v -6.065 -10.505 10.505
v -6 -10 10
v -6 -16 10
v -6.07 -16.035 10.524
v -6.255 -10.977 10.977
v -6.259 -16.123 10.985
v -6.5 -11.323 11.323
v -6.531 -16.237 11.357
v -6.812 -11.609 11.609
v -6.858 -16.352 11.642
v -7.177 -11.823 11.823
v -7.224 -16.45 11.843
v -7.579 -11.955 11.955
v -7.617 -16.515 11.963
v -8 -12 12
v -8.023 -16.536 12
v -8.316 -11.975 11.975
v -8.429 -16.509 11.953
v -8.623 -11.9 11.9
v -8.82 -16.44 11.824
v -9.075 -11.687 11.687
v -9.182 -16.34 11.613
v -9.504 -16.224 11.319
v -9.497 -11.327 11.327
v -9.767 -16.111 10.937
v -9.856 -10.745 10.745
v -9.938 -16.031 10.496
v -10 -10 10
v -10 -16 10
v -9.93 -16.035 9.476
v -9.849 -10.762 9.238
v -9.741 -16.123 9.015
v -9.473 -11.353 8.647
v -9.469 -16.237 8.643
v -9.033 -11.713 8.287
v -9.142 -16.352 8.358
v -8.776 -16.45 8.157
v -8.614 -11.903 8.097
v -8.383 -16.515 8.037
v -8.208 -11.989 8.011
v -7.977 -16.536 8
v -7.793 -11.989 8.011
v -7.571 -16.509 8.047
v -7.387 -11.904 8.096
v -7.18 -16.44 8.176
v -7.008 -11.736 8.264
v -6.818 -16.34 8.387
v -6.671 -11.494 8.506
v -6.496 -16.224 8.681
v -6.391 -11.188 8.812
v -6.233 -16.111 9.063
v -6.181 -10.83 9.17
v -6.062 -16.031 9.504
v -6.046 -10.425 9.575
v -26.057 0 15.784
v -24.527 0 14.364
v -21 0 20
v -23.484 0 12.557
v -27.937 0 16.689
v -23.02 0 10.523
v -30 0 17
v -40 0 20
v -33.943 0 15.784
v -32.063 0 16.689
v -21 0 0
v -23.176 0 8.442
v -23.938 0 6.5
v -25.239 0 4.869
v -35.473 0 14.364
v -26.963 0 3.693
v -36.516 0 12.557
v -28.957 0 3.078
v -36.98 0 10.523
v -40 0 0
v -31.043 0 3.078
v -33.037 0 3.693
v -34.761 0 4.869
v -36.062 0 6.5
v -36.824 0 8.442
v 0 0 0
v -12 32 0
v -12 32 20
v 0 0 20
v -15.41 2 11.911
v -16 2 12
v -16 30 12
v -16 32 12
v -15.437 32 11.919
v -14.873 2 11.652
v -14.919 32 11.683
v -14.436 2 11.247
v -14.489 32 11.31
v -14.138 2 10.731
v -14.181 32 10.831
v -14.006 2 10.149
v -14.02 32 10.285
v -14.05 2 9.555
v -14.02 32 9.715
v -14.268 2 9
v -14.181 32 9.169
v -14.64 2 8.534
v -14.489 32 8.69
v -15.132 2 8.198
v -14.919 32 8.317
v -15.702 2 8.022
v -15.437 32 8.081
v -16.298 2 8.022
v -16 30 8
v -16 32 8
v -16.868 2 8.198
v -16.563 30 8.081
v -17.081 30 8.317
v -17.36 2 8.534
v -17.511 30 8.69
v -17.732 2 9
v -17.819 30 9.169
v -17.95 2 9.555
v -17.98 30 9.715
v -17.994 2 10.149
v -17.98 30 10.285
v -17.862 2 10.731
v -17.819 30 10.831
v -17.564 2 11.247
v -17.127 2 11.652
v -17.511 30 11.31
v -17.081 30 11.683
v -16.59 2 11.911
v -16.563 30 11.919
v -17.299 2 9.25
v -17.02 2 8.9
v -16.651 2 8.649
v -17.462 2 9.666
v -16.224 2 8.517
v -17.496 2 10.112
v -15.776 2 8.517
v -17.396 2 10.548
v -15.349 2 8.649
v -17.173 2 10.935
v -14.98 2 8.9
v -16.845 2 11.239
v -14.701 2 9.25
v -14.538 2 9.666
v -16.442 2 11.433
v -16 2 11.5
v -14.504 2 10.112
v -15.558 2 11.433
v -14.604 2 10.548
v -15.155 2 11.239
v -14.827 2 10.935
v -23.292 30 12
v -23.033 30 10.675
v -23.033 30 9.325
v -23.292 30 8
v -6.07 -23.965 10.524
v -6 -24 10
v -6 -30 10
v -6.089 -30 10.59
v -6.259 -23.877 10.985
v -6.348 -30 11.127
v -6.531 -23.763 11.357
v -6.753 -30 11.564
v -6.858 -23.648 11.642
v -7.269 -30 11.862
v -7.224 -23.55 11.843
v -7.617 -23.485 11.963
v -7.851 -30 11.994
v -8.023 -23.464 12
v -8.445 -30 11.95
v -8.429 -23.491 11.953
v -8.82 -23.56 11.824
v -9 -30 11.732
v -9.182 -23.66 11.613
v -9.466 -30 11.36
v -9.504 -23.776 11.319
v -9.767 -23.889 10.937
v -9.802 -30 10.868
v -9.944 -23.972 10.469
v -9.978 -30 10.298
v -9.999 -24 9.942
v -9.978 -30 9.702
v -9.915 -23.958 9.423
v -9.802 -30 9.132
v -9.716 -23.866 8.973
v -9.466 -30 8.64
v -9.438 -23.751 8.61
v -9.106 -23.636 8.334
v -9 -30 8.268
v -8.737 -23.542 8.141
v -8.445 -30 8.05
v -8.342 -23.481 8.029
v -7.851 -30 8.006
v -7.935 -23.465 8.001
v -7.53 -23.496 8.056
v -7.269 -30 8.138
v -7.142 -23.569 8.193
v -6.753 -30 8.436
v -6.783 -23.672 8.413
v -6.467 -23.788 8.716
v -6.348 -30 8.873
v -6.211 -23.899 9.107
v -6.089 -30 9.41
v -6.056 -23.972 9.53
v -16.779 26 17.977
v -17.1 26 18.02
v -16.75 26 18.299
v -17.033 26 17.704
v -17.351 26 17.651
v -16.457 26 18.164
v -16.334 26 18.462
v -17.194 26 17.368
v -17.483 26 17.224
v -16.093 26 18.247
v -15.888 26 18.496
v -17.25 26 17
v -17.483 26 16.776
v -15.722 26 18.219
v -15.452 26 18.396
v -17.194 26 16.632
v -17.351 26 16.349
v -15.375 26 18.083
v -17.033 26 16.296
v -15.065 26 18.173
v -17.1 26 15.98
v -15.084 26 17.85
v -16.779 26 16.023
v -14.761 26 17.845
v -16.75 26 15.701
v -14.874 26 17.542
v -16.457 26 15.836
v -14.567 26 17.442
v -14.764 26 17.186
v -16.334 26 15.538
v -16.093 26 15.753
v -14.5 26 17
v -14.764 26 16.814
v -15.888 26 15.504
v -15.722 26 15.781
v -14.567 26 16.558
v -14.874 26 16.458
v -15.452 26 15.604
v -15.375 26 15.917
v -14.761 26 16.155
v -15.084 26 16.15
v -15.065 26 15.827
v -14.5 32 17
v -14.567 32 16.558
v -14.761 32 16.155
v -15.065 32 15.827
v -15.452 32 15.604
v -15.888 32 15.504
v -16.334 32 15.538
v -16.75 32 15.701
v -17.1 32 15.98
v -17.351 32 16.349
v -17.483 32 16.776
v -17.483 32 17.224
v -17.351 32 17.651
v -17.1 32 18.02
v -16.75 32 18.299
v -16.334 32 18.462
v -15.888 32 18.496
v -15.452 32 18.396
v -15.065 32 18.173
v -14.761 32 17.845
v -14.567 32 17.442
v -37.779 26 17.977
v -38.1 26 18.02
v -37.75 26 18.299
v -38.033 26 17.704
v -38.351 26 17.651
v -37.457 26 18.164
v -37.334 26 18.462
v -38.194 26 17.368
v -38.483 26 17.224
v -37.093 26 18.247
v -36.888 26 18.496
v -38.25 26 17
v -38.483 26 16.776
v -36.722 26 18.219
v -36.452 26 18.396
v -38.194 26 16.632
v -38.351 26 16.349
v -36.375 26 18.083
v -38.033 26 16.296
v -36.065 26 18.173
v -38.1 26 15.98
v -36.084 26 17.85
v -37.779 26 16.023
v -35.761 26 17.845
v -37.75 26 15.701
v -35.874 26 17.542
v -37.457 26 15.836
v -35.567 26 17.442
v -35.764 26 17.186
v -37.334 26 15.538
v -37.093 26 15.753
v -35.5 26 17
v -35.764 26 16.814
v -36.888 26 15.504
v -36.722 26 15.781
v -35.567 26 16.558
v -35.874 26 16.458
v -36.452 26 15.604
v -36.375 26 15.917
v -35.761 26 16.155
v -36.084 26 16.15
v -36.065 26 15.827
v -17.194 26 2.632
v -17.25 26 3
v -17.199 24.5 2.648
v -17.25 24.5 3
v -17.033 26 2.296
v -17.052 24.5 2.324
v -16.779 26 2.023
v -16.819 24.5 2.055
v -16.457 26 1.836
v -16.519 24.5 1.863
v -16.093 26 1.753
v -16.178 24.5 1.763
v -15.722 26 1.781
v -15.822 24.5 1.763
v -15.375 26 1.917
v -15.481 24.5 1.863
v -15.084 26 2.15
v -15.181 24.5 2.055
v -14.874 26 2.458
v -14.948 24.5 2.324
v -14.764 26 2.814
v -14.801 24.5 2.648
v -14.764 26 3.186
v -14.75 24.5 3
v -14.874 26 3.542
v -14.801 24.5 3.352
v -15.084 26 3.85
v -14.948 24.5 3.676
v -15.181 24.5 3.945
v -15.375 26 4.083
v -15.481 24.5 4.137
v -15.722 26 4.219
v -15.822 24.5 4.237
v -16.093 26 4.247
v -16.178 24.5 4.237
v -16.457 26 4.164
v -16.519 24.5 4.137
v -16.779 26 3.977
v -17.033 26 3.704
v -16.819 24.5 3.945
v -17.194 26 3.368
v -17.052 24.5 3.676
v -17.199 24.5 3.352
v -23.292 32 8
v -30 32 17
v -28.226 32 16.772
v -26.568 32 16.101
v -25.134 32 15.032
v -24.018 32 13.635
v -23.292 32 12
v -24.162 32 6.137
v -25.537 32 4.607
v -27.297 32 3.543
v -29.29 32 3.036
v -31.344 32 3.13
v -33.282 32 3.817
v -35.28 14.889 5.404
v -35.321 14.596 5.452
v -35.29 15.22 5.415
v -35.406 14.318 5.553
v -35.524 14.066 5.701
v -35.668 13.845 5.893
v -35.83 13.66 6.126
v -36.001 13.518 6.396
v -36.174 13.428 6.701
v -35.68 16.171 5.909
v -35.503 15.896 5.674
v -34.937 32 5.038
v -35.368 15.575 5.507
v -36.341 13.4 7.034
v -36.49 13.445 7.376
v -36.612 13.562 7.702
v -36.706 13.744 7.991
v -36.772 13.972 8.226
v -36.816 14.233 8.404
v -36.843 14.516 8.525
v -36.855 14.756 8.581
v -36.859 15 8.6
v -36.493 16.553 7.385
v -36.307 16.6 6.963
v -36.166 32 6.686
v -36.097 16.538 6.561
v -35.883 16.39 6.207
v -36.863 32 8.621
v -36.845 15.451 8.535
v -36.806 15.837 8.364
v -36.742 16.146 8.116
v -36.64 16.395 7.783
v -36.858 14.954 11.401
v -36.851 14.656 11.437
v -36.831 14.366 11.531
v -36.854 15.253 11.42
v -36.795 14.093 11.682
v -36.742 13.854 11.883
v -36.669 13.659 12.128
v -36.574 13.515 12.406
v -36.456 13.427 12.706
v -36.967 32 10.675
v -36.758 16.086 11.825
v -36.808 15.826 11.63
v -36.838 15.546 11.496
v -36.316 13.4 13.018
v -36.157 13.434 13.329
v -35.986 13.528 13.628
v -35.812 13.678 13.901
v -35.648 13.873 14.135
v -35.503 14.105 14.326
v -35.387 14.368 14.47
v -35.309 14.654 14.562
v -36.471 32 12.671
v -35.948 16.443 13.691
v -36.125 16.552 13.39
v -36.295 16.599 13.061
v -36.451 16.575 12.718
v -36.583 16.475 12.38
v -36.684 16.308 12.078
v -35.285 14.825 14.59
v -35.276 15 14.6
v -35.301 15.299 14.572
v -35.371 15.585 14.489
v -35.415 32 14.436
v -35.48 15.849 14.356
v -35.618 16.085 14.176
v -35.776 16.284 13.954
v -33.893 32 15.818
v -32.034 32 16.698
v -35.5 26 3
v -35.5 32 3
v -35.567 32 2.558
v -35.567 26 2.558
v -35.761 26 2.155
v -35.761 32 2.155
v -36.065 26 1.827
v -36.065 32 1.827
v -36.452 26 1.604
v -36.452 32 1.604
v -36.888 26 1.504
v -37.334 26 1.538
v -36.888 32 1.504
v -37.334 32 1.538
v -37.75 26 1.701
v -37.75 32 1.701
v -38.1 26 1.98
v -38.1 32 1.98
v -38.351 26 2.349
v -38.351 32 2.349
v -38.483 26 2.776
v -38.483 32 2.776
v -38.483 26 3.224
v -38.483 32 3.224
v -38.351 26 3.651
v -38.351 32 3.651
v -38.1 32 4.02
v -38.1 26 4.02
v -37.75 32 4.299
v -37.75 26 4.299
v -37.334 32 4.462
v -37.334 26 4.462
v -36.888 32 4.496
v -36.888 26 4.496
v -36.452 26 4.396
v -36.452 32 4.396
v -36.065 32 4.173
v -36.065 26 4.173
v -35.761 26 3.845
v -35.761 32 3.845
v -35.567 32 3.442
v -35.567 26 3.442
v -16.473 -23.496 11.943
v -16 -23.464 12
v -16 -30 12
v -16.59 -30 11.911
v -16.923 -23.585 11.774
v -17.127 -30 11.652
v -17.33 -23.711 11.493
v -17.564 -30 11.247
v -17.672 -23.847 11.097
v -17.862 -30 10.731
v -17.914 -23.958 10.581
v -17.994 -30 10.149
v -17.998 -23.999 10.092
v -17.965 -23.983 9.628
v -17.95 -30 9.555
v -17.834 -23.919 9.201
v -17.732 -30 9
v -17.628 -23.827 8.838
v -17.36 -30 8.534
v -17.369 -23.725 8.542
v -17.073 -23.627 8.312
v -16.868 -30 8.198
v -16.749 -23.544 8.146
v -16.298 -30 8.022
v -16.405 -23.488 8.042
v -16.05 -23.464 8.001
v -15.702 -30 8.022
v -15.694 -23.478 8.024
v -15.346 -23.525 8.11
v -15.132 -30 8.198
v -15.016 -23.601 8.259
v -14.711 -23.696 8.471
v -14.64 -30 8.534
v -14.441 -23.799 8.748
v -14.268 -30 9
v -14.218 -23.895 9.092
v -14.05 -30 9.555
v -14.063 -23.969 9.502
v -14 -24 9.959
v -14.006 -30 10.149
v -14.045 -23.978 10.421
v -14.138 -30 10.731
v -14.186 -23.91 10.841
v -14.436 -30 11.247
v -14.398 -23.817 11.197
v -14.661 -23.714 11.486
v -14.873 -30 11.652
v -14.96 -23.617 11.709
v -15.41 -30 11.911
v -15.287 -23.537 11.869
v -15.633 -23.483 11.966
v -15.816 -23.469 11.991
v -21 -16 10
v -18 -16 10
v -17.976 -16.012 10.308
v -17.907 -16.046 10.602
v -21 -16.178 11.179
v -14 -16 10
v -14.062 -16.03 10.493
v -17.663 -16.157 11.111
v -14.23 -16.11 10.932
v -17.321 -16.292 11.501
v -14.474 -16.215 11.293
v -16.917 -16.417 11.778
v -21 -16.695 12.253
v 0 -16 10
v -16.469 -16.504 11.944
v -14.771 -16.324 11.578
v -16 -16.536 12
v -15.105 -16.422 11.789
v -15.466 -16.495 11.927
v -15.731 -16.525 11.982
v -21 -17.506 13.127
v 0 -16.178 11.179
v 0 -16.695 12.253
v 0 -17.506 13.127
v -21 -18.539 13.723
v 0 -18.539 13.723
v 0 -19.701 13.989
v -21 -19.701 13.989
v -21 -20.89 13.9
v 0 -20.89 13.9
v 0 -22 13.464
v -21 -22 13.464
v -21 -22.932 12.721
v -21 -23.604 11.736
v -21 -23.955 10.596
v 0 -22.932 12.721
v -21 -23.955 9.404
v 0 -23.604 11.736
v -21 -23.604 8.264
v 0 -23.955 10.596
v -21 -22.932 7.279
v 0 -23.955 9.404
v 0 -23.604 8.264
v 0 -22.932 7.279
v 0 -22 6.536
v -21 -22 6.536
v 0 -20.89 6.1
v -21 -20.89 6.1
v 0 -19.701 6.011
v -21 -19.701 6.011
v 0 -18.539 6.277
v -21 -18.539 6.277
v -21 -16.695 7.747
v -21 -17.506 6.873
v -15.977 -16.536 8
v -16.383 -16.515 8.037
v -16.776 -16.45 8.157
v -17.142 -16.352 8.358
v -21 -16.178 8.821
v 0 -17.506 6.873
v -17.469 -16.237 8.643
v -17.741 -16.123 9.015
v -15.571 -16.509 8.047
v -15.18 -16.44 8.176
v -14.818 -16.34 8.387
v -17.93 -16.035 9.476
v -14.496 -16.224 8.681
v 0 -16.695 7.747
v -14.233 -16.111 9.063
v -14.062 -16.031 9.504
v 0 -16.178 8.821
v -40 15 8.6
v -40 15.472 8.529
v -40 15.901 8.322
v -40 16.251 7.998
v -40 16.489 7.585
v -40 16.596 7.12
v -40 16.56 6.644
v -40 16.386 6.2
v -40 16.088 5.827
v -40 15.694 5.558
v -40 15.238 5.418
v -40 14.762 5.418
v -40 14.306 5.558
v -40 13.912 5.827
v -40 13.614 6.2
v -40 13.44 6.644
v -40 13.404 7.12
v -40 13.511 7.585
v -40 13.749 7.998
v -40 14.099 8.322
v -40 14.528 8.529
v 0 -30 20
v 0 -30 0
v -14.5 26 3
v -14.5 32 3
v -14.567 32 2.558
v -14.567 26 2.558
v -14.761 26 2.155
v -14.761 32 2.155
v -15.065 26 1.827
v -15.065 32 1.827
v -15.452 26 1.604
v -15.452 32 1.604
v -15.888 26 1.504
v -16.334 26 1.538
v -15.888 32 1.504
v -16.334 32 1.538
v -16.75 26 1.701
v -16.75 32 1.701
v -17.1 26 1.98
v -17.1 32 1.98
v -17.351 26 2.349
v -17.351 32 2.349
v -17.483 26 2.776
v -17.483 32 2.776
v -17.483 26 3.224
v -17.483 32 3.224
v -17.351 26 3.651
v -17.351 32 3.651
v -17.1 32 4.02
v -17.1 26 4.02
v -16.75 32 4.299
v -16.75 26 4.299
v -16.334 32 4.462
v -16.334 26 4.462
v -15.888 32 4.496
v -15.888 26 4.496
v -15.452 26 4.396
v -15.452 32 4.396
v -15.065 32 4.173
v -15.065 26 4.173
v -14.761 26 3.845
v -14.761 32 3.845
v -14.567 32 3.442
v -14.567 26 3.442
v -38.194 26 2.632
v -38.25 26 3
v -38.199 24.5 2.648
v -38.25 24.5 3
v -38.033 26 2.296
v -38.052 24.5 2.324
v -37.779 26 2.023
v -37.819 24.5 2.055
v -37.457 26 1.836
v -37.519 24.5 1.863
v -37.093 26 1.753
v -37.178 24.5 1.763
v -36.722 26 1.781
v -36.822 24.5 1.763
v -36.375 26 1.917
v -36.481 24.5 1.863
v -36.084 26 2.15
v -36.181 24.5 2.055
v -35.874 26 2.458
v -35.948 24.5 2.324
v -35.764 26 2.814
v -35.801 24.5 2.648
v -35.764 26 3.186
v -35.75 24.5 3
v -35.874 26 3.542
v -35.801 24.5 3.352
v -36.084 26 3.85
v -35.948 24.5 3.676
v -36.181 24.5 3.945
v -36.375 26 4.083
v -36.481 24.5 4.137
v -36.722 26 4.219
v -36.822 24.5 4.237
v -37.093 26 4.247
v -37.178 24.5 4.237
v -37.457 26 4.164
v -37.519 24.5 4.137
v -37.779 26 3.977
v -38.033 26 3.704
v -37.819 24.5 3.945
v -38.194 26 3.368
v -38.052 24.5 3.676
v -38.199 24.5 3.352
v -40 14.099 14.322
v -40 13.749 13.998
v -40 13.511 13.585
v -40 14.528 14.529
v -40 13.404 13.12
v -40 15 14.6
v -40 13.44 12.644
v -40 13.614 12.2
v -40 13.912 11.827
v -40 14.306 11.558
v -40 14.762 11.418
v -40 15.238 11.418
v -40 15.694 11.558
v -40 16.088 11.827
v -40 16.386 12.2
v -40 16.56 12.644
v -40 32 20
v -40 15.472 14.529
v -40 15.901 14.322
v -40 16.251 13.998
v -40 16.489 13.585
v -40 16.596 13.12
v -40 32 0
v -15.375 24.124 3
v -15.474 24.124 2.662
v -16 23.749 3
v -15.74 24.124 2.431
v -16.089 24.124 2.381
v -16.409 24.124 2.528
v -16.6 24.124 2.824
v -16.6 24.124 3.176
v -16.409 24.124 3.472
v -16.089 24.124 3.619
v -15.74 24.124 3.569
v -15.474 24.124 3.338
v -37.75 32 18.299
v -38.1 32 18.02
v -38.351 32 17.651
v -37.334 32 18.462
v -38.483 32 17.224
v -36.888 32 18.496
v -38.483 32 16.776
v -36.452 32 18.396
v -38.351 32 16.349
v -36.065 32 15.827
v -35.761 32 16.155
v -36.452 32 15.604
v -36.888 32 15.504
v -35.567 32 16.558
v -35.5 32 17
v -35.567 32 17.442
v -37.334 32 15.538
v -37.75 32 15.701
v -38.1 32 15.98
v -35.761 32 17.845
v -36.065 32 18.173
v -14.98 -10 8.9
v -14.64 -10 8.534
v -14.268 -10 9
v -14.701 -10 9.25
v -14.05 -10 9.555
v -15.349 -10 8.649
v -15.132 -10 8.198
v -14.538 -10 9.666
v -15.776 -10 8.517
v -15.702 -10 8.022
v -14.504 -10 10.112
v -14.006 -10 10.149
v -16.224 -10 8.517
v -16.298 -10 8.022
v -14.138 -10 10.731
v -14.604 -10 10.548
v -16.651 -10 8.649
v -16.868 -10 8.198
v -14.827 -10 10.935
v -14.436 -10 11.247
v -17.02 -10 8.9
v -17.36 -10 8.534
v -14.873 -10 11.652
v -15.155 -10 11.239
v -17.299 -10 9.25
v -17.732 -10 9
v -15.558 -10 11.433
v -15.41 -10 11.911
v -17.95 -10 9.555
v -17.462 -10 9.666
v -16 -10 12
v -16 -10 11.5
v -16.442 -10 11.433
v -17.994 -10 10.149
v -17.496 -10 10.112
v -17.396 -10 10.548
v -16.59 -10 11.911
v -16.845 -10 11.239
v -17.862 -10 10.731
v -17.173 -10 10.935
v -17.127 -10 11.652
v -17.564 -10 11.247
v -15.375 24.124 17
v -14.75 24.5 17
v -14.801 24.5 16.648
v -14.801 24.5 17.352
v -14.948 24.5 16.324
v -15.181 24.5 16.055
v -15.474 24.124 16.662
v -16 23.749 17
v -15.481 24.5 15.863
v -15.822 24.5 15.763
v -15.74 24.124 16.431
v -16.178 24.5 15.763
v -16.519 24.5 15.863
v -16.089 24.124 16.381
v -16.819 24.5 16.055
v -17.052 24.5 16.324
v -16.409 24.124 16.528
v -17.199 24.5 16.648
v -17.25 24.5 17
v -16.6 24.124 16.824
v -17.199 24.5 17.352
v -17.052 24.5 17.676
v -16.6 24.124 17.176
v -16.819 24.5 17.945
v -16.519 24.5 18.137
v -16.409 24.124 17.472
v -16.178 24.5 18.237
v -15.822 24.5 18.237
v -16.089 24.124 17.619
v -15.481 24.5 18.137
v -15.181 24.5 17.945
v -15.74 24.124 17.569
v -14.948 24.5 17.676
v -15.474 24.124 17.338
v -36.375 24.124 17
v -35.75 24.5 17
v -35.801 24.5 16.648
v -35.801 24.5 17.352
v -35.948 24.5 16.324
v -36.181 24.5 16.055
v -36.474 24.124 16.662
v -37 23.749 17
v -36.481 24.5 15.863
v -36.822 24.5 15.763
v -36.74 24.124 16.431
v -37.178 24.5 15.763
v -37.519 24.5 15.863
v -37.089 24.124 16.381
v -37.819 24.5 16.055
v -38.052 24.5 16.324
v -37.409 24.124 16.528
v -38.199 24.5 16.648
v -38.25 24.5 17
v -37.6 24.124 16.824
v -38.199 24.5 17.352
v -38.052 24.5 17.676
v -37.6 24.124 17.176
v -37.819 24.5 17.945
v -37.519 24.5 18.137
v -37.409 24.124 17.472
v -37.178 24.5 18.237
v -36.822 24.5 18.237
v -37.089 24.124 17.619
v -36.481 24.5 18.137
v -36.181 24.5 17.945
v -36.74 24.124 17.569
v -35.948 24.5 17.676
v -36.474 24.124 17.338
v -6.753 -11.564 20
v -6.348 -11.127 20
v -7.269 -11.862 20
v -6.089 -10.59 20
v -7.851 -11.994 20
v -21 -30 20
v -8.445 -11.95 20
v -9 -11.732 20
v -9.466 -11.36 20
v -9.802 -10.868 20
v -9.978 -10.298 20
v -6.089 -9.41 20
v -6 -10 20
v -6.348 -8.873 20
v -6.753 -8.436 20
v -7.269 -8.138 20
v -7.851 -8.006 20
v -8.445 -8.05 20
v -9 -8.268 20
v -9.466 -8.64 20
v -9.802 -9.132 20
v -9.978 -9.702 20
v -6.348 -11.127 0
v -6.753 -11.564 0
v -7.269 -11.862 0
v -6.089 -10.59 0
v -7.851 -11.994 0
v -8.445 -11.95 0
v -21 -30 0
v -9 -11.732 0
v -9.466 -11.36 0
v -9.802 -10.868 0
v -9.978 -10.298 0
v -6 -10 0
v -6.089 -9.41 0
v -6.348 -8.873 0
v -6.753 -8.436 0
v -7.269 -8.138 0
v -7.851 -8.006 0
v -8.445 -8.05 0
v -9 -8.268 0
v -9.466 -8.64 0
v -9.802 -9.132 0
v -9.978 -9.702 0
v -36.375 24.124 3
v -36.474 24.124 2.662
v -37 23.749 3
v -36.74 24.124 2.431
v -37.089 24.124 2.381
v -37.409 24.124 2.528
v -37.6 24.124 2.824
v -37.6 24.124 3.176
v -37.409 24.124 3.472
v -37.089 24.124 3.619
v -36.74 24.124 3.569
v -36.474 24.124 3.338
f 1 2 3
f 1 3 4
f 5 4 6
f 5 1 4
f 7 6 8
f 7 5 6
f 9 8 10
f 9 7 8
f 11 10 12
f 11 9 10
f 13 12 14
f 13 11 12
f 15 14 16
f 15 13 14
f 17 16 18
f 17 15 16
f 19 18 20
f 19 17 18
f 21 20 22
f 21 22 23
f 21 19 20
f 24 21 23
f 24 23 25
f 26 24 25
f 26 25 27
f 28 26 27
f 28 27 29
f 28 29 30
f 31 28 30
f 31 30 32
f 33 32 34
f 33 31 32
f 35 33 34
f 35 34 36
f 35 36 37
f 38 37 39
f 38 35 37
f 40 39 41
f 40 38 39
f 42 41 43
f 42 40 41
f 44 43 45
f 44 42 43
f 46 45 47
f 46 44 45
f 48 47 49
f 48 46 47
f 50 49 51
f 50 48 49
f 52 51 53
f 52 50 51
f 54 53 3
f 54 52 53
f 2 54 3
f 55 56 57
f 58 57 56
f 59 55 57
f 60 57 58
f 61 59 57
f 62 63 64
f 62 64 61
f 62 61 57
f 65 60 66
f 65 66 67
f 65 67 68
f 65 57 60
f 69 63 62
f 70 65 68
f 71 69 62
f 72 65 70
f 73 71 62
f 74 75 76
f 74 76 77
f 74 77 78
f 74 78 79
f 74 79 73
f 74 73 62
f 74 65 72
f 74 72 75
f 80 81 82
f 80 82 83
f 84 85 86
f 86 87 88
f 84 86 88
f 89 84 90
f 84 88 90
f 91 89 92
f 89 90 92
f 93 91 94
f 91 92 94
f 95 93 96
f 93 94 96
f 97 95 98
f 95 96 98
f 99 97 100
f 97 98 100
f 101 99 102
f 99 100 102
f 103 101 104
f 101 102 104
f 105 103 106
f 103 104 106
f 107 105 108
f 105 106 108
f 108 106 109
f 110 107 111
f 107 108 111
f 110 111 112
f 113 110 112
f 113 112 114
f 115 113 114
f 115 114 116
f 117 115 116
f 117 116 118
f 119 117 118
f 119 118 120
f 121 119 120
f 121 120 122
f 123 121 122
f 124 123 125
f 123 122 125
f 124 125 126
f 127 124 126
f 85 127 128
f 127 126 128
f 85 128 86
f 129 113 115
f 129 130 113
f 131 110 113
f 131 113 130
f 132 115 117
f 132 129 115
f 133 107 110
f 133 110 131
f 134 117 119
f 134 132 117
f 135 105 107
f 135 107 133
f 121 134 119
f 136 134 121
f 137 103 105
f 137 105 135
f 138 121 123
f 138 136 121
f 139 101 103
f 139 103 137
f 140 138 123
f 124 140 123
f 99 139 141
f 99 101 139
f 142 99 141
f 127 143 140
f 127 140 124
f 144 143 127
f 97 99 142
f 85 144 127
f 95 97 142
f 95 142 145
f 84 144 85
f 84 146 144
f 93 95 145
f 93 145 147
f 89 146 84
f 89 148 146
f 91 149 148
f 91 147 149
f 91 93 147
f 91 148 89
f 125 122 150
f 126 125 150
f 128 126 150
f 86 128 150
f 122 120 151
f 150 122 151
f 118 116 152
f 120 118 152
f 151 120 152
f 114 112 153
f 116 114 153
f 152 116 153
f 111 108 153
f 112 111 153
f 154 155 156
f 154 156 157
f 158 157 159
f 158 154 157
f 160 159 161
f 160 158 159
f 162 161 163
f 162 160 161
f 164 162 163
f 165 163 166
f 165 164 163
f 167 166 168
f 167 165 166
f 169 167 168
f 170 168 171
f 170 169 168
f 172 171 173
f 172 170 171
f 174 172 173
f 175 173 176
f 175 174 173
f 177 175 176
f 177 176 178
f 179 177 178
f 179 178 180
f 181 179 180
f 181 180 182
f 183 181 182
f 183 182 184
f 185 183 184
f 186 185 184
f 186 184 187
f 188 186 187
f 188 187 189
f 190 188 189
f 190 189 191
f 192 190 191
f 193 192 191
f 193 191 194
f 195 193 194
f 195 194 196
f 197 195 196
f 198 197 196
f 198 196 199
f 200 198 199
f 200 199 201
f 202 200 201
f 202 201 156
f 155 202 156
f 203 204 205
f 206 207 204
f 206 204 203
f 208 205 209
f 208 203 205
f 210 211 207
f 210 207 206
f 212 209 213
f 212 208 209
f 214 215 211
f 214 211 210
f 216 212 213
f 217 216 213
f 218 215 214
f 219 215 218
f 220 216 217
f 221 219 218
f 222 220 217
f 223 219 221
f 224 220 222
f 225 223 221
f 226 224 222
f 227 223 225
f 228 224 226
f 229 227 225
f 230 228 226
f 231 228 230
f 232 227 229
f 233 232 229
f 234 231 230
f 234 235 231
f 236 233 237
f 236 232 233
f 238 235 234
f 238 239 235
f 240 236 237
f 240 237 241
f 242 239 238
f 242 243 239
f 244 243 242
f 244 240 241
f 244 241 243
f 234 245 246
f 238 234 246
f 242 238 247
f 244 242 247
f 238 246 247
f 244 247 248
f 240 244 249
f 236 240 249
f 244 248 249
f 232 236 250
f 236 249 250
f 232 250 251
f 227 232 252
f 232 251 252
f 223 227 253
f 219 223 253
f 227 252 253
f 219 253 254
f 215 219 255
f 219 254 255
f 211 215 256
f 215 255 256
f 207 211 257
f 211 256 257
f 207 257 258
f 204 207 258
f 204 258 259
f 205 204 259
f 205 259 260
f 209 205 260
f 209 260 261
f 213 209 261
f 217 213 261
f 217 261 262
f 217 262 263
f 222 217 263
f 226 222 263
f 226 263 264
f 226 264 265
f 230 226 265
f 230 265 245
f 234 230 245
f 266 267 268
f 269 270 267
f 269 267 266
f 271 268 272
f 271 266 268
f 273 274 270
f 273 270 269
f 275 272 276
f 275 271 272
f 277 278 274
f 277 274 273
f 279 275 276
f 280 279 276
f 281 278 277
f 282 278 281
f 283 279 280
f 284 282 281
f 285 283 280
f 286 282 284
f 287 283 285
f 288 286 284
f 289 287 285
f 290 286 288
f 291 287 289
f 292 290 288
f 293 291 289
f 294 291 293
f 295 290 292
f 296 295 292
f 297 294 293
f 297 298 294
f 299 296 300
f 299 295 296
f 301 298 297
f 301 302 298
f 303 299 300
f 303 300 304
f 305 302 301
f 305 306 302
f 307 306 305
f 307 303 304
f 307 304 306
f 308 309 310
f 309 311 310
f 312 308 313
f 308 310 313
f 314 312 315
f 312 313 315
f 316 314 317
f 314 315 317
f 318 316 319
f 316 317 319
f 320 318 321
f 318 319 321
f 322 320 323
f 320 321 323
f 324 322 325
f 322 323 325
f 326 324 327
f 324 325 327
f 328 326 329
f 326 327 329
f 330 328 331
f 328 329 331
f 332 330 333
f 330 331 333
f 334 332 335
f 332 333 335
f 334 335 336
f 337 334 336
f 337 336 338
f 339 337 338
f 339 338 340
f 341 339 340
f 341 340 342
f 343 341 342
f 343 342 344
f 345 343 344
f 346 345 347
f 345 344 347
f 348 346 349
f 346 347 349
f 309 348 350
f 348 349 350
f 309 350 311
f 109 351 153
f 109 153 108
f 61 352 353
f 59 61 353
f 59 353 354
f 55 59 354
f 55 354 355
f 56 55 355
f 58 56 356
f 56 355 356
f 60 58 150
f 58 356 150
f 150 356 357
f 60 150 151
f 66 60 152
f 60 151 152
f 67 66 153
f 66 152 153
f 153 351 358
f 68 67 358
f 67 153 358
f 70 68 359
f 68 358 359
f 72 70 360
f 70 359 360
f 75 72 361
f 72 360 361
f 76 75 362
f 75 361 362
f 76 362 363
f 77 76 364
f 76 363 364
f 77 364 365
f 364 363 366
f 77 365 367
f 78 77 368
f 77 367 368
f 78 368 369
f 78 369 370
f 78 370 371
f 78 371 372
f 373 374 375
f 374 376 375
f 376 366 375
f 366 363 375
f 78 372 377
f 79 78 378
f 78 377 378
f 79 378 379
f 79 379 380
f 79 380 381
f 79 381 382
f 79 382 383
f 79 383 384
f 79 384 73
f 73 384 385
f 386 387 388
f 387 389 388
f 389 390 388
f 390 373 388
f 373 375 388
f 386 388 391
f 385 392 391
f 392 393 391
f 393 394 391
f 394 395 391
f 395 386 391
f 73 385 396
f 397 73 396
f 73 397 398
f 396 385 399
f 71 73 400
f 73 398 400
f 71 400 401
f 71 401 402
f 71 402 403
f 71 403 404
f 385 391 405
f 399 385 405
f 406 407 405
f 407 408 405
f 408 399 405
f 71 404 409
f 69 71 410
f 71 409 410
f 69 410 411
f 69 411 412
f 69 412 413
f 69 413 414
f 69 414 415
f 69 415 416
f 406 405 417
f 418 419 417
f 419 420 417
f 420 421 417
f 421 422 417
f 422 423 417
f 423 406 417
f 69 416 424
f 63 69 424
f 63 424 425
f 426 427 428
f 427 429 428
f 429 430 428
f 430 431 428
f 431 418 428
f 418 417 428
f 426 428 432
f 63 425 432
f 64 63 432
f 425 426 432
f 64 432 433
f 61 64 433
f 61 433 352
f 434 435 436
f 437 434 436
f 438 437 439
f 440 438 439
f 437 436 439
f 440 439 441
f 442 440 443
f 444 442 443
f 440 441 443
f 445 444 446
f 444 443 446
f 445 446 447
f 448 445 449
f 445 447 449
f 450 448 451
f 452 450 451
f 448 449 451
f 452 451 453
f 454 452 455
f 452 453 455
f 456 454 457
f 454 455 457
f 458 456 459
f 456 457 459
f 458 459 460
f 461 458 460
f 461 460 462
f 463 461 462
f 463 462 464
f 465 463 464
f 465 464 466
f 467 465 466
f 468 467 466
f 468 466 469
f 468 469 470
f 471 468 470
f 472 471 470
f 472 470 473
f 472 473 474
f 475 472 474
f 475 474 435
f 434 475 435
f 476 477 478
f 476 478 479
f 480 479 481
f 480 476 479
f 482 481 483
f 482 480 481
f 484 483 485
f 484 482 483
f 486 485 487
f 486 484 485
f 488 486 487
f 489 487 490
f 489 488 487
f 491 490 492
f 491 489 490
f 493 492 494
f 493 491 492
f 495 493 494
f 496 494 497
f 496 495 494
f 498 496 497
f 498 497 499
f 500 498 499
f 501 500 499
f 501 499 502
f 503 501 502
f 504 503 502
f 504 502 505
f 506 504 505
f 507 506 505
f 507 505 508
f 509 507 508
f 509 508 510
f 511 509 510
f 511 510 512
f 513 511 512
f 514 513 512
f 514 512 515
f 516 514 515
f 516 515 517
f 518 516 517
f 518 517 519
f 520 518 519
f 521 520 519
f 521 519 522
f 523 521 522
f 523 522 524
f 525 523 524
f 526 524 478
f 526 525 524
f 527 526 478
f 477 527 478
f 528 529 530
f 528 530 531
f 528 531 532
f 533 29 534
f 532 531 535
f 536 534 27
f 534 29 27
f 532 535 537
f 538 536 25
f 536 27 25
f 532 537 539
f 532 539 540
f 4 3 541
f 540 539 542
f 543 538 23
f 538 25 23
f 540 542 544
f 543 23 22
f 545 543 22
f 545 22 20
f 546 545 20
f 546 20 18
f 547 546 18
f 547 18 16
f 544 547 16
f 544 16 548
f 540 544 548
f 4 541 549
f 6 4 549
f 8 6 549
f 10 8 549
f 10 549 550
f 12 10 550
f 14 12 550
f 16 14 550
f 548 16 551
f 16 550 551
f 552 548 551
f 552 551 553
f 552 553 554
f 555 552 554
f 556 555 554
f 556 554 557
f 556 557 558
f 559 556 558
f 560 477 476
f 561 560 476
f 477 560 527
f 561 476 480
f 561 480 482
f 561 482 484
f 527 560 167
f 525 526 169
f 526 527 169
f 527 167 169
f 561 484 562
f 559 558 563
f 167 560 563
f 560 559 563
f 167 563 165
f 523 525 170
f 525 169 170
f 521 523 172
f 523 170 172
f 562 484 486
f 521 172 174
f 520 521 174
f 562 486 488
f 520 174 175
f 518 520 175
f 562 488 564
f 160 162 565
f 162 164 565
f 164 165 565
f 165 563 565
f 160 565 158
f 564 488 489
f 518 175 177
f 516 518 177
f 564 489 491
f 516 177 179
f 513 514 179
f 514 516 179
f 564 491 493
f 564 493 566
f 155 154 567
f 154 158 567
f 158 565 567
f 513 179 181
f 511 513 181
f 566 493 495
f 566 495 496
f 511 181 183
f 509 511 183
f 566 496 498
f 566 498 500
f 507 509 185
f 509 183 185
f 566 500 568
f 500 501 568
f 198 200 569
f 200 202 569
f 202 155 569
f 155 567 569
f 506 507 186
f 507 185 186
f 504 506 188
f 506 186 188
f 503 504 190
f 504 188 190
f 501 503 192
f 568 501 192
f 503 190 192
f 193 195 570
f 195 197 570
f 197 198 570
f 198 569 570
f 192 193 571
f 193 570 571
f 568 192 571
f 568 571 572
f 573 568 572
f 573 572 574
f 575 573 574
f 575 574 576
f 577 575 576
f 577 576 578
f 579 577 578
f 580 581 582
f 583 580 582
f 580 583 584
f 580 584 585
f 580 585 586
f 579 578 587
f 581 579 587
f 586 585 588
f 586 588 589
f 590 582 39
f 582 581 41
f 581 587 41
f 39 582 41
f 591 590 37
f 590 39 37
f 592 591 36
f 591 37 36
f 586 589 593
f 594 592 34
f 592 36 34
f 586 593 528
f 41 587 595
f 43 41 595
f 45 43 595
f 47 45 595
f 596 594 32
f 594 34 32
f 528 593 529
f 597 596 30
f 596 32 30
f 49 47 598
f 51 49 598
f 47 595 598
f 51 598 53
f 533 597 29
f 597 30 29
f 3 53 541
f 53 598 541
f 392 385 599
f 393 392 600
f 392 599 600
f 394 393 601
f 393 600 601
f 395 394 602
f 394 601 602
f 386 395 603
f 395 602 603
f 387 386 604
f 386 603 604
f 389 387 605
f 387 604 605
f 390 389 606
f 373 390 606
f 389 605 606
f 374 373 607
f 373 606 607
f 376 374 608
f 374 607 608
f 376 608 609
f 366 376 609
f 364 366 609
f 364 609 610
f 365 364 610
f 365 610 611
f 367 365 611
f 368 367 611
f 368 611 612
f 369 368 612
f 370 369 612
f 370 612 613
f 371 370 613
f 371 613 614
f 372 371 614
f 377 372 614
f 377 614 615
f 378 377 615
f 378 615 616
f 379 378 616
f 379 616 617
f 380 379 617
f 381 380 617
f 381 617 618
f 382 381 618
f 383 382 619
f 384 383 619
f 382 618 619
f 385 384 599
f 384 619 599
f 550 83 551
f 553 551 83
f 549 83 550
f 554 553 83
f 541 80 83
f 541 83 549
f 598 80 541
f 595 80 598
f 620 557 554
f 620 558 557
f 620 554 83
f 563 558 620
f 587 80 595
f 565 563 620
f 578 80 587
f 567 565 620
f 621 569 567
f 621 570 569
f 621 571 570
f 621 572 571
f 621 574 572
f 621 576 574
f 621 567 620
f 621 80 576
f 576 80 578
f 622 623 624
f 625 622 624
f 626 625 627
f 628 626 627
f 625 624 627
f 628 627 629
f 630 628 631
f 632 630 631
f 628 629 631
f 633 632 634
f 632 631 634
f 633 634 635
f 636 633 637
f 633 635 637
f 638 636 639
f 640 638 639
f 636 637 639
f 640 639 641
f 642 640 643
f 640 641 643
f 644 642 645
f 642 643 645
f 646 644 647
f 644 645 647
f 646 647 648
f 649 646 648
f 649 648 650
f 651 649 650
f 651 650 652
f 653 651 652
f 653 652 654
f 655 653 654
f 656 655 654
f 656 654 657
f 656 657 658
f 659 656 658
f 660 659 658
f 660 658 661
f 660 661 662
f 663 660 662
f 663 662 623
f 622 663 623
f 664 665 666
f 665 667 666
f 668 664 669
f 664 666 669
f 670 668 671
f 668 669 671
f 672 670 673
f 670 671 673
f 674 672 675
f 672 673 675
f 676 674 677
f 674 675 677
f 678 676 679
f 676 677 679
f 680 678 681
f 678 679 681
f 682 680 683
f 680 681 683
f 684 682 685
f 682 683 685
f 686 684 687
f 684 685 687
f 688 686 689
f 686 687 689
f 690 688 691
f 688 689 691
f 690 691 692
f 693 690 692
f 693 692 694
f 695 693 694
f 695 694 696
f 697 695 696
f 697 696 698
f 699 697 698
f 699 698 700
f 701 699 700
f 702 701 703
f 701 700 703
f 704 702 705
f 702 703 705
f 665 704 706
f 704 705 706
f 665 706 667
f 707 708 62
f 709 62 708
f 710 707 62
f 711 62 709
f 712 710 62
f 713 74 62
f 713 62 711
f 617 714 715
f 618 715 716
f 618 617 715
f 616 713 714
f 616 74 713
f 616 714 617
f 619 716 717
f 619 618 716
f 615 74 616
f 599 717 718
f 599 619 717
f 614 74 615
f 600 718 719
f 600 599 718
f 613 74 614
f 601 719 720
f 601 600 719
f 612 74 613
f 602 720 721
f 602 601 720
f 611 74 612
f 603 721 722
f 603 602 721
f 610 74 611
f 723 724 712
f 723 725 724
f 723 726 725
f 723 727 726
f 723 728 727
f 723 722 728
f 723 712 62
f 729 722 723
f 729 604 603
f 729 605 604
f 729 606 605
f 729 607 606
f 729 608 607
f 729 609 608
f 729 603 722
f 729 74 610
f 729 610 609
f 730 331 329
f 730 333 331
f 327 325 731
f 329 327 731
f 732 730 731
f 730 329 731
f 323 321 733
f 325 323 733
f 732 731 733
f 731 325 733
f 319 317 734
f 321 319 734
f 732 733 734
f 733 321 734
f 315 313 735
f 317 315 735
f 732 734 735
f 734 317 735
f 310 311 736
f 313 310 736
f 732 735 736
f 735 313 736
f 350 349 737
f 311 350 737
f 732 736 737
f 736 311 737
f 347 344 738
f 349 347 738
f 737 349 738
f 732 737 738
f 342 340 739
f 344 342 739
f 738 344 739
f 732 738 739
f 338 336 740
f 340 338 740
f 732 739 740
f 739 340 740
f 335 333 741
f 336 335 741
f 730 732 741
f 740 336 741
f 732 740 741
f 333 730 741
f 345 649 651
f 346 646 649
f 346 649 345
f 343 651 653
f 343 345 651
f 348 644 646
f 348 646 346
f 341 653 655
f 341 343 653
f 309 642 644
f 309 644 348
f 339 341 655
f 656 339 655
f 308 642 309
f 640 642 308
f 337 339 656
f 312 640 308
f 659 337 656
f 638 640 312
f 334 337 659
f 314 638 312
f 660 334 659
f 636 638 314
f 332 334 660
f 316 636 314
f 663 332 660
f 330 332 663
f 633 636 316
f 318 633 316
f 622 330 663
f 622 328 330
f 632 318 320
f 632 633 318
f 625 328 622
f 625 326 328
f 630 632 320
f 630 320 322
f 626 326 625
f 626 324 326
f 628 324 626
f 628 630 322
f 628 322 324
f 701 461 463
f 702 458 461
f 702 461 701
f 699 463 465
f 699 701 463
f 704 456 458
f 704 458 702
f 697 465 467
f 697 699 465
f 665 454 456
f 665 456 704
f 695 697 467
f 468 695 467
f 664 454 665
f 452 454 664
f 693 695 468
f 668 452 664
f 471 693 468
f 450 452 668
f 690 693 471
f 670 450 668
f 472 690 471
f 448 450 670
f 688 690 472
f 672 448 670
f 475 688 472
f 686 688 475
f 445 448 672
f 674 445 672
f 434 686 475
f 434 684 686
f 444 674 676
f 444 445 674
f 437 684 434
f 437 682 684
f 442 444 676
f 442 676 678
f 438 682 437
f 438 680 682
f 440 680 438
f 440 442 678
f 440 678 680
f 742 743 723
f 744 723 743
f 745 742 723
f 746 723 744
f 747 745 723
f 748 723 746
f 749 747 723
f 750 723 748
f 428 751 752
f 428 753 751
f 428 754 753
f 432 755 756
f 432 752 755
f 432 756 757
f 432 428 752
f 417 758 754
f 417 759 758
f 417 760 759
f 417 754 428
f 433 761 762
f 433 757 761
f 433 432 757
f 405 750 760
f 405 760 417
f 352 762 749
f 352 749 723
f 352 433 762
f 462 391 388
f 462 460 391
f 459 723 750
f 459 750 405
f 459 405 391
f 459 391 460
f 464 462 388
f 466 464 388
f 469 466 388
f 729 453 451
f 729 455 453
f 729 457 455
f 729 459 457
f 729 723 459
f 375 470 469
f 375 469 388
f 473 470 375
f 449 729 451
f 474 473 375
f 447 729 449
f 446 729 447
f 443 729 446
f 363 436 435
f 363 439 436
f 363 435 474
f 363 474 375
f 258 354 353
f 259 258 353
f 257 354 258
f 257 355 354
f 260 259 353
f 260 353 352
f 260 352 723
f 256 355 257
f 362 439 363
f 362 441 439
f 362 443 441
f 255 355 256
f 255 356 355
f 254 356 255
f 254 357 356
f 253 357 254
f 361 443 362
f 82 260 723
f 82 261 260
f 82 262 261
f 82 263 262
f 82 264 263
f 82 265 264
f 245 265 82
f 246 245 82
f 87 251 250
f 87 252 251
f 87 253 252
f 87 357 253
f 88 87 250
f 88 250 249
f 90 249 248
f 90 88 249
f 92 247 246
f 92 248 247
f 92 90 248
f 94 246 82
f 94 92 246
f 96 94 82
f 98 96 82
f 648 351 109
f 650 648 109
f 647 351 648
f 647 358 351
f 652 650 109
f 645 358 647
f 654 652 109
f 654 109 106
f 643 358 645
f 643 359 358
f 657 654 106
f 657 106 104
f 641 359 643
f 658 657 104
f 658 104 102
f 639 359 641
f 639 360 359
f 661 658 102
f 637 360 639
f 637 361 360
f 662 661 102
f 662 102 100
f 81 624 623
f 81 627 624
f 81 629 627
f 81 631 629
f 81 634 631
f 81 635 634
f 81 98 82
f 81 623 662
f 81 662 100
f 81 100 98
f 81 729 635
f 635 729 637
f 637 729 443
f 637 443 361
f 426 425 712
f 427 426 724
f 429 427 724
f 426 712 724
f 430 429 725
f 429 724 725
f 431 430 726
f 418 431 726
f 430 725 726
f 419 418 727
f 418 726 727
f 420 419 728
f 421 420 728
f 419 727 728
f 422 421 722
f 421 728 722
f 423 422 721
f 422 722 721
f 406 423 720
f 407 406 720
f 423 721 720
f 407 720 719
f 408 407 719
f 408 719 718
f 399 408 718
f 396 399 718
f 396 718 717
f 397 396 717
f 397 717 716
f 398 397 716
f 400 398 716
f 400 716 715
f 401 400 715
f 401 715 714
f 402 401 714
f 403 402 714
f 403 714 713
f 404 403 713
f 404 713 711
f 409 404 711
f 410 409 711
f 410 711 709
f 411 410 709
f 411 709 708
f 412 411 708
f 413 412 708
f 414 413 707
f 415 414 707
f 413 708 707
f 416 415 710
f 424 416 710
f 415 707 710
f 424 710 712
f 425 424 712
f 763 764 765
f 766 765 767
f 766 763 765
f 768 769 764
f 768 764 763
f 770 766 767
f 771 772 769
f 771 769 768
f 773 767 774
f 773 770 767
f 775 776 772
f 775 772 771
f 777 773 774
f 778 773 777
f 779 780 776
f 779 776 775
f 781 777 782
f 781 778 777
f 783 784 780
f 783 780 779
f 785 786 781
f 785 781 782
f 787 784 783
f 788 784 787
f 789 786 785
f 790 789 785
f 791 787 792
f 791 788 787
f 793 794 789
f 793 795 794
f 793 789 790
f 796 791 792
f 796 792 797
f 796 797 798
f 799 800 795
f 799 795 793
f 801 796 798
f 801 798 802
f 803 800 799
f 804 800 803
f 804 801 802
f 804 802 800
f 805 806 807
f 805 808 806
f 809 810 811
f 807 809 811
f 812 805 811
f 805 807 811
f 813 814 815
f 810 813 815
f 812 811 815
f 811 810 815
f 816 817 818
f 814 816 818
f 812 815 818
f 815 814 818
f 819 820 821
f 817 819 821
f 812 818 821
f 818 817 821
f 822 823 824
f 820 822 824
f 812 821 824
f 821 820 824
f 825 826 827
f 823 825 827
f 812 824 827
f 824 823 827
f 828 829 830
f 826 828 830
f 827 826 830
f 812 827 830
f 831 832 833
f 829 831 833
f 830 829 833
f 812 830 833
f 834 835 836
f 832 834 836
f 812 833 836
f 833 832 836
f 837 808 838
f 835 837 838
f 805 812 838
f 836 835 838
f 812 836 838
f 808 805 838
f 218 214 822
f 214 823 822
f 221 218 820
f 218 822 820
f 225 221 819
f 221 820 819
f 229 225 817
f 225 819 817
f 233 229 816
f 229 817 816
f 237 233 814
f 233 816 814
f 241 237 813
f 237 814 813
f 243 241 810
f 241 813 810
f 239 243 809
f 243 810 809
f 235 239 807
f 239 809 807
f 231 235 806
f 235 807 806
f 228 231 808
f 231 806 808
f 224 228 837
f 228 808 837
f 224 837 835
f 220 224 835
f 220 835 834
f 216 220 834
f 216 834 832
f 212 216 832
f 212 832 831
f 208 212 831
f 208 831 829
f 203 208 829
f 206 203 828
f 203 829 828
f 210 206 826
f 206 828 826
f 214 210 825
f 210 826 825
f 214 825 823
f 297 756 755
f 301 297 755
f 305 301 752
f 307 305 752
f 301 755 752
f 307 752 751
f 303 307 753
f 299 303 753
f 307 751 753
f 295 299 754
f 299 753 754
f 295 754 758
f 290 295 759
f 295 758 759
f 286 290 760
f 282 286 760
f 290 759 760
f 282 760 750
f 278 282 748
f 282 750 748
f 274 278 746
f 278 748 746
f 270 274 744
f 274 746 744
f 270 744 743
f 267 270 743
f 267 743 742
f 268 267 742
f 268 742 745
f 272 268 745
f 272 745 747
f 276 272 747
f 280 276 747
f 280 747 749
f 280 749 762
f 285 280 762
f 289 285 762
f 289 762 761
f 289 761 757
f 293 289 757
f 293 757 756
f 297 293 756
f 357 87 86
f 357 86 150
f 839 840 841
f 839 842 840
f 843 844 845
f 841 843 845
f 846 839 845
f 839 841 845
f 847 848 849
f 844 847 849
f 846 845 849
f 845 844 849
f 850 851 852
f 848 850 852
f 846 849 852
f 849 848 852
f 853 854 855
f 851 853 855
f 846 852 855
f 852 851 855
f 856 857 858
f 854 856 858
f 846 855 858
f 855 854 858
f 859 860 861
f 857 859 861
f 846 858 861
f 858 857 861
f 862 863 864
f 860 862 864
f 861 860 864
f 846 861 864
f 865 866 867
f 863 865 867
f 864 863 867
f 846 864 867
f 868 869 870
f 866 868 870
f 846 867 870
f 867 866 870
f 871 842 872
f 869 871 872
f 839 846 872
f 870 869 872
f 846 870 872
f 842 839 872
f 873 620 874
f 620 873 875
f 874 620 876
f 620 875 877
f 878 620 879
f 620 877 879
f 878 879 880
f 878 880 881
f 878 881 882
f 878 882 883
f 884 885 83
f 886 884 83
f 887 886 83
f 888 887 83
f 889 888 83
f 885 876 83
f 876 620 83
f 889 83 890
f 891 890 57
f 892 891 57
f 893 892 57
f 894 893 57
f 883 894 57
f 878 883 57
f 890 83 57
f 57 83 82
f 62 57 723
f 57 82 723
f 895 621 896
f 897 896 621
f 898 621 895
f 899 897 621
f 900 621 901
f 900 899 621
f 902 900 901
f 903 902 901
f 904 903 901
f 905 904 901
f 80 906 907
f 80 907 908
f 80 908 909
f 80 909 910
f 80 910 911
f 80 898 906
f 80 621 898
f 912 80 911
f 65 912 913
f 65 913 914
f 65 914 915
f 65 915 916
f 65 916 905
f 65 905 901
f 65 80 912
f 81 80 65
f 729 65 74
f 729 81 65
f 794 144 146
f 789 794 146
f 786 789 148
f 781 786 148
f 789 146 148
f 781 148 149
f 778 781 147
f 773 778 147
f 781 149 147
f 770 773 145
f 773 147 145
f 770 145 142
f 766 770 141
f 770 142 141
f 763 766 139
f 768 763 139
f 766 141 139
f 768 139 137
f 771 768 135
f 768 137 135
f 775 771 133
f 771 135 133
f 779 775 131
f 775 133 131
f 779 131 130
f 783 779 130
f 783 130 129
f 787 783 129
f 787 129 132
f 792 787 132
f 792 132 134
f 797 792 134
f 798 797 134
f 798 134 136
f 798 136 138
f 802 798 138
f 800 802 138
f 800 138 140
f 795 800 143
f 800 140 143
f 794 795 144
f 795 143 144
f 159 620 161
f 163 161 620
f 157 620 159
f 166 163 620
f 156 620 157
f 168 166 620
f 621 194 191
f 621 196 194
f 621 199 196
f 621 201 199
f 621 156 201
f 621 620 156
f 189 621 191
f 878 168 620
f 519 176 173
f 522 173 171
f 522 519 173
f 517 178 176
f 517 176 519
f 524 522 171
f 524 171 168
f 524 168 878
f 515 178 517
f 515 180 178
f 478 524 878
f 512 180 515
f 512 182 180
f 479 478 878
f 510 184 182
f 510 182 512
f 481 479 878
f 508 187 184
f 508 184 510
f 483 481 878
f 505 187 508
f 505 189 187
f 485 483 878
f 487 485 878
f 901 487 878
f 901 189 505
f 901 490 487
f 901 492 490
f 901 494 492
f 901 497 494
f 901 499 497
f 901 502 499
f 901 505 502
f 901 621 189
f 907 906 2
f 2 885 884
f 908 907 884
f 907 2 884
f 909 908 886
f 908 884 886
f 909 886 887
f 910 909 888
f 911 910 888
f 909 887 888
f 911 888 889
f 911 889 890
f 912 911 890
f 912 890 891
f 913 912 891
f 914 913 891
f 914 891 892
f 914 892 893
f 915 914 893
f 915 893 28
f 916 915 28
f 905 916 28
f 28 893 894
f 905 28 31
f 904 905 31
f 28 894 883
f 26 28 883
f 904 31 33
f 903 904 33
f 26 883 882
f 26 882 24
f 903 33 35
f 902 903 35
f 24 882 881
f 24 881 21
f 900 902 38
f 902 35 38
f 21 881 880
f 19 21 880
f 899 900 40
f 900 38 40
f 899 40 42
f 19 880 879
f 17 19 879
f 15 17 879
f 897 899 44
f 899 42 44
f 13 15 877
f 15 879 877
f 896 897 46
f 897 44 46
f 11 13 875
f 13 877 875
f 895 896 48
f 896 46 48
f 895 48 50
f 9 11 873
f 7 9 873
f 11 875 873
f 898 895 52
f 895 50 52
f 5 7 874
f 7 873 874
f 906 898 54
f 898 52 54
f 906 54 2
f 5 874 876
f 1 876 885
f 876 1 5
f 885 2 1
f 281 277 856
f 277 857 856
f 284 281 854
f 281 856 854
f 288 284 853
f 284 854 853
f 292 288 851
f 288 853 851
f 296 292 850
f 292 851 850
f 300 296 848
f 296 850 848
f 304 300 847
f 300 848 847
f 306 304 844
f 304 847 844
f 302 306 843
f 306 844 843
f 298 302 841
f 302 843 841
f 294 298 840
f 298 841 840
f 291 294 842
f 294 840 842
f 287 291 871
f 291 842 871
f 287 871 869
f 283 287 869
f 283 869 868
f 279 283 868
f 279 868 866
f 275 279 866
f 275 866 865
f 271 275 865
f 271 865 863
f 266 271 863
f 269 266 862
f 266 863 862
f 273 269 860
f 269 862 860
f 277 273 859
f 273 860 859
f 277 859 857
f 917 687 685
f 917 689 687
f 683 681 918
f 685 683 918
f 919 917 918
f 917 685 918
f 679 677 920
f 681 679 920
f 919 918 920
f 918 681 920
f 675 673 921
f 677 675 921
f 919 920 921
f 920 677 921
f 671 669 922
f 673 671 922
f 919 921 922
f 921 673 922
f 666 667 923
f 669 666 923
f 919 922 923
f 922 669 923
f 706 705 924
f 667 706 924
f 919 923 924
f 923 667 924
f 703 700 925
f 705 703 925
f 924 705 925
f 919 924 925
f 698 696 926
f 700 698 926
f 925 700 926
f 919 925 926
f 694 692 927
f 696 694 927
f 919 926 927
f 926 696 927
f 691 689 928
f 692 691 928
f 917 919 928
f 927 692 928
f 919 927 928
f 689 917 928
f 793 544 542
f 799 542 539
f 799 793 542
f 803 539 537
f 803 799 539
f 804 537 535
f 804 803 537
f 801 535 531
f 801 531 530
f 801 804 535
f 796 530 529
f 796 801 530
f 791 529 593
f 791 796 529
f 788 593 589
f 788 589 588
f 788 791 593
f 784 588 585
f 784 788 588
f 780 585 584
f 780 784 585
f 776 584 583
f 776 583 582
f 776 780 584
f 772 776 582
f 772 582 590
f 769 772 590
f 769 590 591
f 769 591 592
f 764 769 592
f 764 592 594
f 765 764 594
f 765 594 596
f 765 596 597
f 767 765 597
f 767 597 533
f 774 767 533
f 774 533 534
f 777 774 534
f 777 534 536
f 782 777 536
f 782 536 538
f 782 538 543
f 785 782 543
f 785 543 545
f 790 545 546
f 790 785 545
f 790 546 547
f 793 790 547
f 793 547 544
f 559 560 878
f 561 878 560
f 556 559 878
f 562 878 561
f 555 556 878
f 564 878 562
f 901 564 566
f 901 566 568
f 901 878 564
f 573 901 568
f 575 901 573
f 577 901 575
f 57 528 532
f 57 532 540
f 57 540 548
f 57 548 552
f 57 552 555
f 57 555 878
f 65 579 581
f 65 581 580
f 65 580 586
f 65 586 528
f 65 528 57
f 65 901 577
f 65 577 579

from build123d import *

# Parameters (mm, degrees)
BOSS_EXTRUDE1_DEPTH         = 20
SKETCH2_R                   = 7
CUT_EXTRUDE1_DEPTH          = 77.446059414
SKETCH3_R                   = 4
CUT_EXTRUDE2_DEPTH          = 55.990908339
SKETCH4_R                   = 2
CUT_EXTRUDE3_DEPTH          = 30
CUT_EXTRUDE5_DEPTH          = 2
SKETCH6_R                   = 2
CUT_EXTRUDE6_DEPTH          = 55.990908339
CUT_EXTRUDE7_REACH          = 56.991
CUT_EXTRUDE7_END_RADIUS     = 7
SKETCH7_R                   = 1.6
M3_TAPPED_HOLE1_D           = 2.5
M3_TAPPED_HOLE1_DEPTH       = 7.5
M3_TAPPED_HOLE1_CBORE_D     = 3
M3_TAPPED_HOLE1_CBORE_DEPTH = 6
M3_TAPPED_HOLE1_TIP         = 0.751075774
CUT_EXTRUDE8_START          = -20
SKETCH11_R                  = 2
CUT_EXTRUDE8_DEPTH          = 20
SKETCH12_R                  = 1.5
CUT_EXTRUDE9_DEPTH          = 12


with BuildPart() as part:
    # Sketch1 → Boss-Extrude1 (new body)
    with BuildSketch(Plane.XY):
        Polygon((0, 0), (0, -30), (-21, -30), (-21, 0), (-40, 0), (-40, 32), (-12, 32), align=None)
    extrude(amount=BOSS_EXTRUDE1_DEPTH)

    # Sketch2 → Cut-Extrude1 (cut, through all)
    with BuildSketch(Plane(origin=(0, 32, 0), x_dir=(1, 0, 0), z_dir=(0, 1, 0))):
        with Locations(Location((-30, -10, 0), (0, 0, 270))):
            Circle(SKETCH2_R)
    extrude(amount=-CUT_EXTRUDE1_DEPTH, mode=Mode.SUBTRACT)

    # Sketch3 → Cut-Extrude2 (cut, through all)
    with BuildSketch(Plane(origin=(0, 0, 0), x_dir=(0, 0, -1), z_dir=(1, 0, 0))):
        with Locations(Location((-10, -20, 0), (0, 0, 90))):
            Circle(SKETCH3_R)
    extrude(amount=-CUT_EXTRUDE2_DEPTH, mode=Mode.SUBTRACT)

    # Sketch4 → Cut-Extrude3 (cut)
    with BuildSketch(Plane(origin=(0, 32, 0), x_dir=(1, 0, 0), z_dir=(0, 1, 0))):
        with Locations(Location((-16, -10, 0), (0, 0, 270))):
            Circle(SKETCH4_R)
    extrude(amount=-CUT_EXTRUDE3_DEPTH, mode=Mode.SUBTRACT)

    # Sketch5 → Cut-Extrude5 (cut)
    with BuildSketch(Plane(origin=(0, 32, 0), x_dir=(1, 0, 0), z_dir=(0, 1, 0))):
        with BuildLine():
            Line((-16, -12), (-23.291796068, -12))
            ThreePointArc((-23.291796068, -12), (-23, -10), (-23.291796068, -8))
            Line((-23.291796068, -8), (-16, -8))
            ThreePointArc((-16, -8), (-14, -10), (-16, -12))
        make_face()
    extrude(amount=-CUT_EXTRUDE5_DEPTH, mode=Mode.SUBTRACT)

    # Sketch6 → Cut-Extrude6 (cut, through all)
    with BuildSketch(Plane.XY.offset(20)):
        with Locations((-8, -10)):
            Circle(SKETCH6_R)
    extrude(amount=-CUT_EXTRUDE6_DEPTH, mode=Mode.SUBTRACT)

    # Cut-Extrude7: up to this cylinder (the profile starts outside it)
    cut_extrude7_end = Plane(origin=(-30, 15, 10), z_dir=(0, 1, 0)) * Cylinder(CUT_EXTRUDE7_END_RADIUS, 128.982, mode=Mode.PRIVATE)
    # Sketch7 → Cut-Extrude7 (cut, up to the surface)
    with BuildSketch(Plane.ZY.offset(40), mode=Mode.PRIVATE) as cut_extrude7_sk1:
        with Locations((7, 15)):
            Circle(SKETCH7_R)
    cut_extrude7_tool1 = extrude(cut_extrude7_sk1.sketch, amount=-CUT_EXTRUDE7_REACH, mode=Mode.PRIVATE) - cut_extrude7_end
    add(cut_extrude7_tool1.solids().sort_by_distance((-40, 15, 7))[0], mode=Mode.SUBTRACT)
    # Sketch7 → Cut-Extrude7 (cut, up to the surface)
    with BuildSketch(Plane.ZY.offset(40), mode=Mode.PRIVATE) as cut_extrude7_sk2:
        with Locations((13, 15)):
            Circle(SKETCH7_R)
    cut_extrude7_tool2 = extrude(cut_extrude7_sk2.sketch, amount=-CUT_EXTRUDE7_REACH, mode=Mode.PRIVATE) - cut_extrude7_end
    add(cut_extrude7_tool2.solids().sort_by_distance((-40, 15, 13))[0], mode=Mode.SUBTRACT)

    # M3 Tapped Hole1
    with Locations(Plane(origin=(0, 32, 0), x_dir=(1, 0, 0), z_dir=(0, 1, 0))):
        with Locations((-37, -3), (-16, -3), (-16, -17), (-37, -17)):
            CounterBoreHole(M3_TAPPED_HOLE1_D / 2, M3_TAPPED_HOLE1_CBORE_D / 2, M3_TAPPED_HOLE1_CBORE_DEPTH, depth=M3_TAPPED_HOLE1_DEPTH)
            with Locations((0, 0, -(M3_TAPPED_HOLE1_DEPTH + M3_TAPPED_HOLE1_TIP / 2))):  # 118° drill point
                Cone(0, M3_TAPPED_HOLE1_D / 2, M3_TAPPED_HOLE1_TIP, mode=Mode.SUBTRACT)

    # Sketch11 → Cut-Extrude8 (cut)
    with BuildSketch(Plane.XZ.offset(30).offset(CUT_EXTRUDE8_START)):
        with Locations((-8, 10)):
            Circle(SKETCH11_R)
        with Locations(Location((-16, 10, 0), (0, 0, 90))):
            Circle(SKETCH11_R)
    extrude(amount=CUT_EXTRUDE8_DEPTH, mode=Mode.SUBTRACT)

    # Sketch12 → Cut-Extrude9 (cut)
    with BuildSketch(Plane(origin=(0, 2, 0), x_dir=(1, 0, 0), z_dir=(0, 1, 0))):
        with Locations(Location((-16, -10, 0), (0, 0, 270))):
            Circle(SKETCH12_R)
    extrude(amount=-CUT_EXTRUDE9_DEPTH, mode=Mode.SUBTRACT)


solid = part.part
